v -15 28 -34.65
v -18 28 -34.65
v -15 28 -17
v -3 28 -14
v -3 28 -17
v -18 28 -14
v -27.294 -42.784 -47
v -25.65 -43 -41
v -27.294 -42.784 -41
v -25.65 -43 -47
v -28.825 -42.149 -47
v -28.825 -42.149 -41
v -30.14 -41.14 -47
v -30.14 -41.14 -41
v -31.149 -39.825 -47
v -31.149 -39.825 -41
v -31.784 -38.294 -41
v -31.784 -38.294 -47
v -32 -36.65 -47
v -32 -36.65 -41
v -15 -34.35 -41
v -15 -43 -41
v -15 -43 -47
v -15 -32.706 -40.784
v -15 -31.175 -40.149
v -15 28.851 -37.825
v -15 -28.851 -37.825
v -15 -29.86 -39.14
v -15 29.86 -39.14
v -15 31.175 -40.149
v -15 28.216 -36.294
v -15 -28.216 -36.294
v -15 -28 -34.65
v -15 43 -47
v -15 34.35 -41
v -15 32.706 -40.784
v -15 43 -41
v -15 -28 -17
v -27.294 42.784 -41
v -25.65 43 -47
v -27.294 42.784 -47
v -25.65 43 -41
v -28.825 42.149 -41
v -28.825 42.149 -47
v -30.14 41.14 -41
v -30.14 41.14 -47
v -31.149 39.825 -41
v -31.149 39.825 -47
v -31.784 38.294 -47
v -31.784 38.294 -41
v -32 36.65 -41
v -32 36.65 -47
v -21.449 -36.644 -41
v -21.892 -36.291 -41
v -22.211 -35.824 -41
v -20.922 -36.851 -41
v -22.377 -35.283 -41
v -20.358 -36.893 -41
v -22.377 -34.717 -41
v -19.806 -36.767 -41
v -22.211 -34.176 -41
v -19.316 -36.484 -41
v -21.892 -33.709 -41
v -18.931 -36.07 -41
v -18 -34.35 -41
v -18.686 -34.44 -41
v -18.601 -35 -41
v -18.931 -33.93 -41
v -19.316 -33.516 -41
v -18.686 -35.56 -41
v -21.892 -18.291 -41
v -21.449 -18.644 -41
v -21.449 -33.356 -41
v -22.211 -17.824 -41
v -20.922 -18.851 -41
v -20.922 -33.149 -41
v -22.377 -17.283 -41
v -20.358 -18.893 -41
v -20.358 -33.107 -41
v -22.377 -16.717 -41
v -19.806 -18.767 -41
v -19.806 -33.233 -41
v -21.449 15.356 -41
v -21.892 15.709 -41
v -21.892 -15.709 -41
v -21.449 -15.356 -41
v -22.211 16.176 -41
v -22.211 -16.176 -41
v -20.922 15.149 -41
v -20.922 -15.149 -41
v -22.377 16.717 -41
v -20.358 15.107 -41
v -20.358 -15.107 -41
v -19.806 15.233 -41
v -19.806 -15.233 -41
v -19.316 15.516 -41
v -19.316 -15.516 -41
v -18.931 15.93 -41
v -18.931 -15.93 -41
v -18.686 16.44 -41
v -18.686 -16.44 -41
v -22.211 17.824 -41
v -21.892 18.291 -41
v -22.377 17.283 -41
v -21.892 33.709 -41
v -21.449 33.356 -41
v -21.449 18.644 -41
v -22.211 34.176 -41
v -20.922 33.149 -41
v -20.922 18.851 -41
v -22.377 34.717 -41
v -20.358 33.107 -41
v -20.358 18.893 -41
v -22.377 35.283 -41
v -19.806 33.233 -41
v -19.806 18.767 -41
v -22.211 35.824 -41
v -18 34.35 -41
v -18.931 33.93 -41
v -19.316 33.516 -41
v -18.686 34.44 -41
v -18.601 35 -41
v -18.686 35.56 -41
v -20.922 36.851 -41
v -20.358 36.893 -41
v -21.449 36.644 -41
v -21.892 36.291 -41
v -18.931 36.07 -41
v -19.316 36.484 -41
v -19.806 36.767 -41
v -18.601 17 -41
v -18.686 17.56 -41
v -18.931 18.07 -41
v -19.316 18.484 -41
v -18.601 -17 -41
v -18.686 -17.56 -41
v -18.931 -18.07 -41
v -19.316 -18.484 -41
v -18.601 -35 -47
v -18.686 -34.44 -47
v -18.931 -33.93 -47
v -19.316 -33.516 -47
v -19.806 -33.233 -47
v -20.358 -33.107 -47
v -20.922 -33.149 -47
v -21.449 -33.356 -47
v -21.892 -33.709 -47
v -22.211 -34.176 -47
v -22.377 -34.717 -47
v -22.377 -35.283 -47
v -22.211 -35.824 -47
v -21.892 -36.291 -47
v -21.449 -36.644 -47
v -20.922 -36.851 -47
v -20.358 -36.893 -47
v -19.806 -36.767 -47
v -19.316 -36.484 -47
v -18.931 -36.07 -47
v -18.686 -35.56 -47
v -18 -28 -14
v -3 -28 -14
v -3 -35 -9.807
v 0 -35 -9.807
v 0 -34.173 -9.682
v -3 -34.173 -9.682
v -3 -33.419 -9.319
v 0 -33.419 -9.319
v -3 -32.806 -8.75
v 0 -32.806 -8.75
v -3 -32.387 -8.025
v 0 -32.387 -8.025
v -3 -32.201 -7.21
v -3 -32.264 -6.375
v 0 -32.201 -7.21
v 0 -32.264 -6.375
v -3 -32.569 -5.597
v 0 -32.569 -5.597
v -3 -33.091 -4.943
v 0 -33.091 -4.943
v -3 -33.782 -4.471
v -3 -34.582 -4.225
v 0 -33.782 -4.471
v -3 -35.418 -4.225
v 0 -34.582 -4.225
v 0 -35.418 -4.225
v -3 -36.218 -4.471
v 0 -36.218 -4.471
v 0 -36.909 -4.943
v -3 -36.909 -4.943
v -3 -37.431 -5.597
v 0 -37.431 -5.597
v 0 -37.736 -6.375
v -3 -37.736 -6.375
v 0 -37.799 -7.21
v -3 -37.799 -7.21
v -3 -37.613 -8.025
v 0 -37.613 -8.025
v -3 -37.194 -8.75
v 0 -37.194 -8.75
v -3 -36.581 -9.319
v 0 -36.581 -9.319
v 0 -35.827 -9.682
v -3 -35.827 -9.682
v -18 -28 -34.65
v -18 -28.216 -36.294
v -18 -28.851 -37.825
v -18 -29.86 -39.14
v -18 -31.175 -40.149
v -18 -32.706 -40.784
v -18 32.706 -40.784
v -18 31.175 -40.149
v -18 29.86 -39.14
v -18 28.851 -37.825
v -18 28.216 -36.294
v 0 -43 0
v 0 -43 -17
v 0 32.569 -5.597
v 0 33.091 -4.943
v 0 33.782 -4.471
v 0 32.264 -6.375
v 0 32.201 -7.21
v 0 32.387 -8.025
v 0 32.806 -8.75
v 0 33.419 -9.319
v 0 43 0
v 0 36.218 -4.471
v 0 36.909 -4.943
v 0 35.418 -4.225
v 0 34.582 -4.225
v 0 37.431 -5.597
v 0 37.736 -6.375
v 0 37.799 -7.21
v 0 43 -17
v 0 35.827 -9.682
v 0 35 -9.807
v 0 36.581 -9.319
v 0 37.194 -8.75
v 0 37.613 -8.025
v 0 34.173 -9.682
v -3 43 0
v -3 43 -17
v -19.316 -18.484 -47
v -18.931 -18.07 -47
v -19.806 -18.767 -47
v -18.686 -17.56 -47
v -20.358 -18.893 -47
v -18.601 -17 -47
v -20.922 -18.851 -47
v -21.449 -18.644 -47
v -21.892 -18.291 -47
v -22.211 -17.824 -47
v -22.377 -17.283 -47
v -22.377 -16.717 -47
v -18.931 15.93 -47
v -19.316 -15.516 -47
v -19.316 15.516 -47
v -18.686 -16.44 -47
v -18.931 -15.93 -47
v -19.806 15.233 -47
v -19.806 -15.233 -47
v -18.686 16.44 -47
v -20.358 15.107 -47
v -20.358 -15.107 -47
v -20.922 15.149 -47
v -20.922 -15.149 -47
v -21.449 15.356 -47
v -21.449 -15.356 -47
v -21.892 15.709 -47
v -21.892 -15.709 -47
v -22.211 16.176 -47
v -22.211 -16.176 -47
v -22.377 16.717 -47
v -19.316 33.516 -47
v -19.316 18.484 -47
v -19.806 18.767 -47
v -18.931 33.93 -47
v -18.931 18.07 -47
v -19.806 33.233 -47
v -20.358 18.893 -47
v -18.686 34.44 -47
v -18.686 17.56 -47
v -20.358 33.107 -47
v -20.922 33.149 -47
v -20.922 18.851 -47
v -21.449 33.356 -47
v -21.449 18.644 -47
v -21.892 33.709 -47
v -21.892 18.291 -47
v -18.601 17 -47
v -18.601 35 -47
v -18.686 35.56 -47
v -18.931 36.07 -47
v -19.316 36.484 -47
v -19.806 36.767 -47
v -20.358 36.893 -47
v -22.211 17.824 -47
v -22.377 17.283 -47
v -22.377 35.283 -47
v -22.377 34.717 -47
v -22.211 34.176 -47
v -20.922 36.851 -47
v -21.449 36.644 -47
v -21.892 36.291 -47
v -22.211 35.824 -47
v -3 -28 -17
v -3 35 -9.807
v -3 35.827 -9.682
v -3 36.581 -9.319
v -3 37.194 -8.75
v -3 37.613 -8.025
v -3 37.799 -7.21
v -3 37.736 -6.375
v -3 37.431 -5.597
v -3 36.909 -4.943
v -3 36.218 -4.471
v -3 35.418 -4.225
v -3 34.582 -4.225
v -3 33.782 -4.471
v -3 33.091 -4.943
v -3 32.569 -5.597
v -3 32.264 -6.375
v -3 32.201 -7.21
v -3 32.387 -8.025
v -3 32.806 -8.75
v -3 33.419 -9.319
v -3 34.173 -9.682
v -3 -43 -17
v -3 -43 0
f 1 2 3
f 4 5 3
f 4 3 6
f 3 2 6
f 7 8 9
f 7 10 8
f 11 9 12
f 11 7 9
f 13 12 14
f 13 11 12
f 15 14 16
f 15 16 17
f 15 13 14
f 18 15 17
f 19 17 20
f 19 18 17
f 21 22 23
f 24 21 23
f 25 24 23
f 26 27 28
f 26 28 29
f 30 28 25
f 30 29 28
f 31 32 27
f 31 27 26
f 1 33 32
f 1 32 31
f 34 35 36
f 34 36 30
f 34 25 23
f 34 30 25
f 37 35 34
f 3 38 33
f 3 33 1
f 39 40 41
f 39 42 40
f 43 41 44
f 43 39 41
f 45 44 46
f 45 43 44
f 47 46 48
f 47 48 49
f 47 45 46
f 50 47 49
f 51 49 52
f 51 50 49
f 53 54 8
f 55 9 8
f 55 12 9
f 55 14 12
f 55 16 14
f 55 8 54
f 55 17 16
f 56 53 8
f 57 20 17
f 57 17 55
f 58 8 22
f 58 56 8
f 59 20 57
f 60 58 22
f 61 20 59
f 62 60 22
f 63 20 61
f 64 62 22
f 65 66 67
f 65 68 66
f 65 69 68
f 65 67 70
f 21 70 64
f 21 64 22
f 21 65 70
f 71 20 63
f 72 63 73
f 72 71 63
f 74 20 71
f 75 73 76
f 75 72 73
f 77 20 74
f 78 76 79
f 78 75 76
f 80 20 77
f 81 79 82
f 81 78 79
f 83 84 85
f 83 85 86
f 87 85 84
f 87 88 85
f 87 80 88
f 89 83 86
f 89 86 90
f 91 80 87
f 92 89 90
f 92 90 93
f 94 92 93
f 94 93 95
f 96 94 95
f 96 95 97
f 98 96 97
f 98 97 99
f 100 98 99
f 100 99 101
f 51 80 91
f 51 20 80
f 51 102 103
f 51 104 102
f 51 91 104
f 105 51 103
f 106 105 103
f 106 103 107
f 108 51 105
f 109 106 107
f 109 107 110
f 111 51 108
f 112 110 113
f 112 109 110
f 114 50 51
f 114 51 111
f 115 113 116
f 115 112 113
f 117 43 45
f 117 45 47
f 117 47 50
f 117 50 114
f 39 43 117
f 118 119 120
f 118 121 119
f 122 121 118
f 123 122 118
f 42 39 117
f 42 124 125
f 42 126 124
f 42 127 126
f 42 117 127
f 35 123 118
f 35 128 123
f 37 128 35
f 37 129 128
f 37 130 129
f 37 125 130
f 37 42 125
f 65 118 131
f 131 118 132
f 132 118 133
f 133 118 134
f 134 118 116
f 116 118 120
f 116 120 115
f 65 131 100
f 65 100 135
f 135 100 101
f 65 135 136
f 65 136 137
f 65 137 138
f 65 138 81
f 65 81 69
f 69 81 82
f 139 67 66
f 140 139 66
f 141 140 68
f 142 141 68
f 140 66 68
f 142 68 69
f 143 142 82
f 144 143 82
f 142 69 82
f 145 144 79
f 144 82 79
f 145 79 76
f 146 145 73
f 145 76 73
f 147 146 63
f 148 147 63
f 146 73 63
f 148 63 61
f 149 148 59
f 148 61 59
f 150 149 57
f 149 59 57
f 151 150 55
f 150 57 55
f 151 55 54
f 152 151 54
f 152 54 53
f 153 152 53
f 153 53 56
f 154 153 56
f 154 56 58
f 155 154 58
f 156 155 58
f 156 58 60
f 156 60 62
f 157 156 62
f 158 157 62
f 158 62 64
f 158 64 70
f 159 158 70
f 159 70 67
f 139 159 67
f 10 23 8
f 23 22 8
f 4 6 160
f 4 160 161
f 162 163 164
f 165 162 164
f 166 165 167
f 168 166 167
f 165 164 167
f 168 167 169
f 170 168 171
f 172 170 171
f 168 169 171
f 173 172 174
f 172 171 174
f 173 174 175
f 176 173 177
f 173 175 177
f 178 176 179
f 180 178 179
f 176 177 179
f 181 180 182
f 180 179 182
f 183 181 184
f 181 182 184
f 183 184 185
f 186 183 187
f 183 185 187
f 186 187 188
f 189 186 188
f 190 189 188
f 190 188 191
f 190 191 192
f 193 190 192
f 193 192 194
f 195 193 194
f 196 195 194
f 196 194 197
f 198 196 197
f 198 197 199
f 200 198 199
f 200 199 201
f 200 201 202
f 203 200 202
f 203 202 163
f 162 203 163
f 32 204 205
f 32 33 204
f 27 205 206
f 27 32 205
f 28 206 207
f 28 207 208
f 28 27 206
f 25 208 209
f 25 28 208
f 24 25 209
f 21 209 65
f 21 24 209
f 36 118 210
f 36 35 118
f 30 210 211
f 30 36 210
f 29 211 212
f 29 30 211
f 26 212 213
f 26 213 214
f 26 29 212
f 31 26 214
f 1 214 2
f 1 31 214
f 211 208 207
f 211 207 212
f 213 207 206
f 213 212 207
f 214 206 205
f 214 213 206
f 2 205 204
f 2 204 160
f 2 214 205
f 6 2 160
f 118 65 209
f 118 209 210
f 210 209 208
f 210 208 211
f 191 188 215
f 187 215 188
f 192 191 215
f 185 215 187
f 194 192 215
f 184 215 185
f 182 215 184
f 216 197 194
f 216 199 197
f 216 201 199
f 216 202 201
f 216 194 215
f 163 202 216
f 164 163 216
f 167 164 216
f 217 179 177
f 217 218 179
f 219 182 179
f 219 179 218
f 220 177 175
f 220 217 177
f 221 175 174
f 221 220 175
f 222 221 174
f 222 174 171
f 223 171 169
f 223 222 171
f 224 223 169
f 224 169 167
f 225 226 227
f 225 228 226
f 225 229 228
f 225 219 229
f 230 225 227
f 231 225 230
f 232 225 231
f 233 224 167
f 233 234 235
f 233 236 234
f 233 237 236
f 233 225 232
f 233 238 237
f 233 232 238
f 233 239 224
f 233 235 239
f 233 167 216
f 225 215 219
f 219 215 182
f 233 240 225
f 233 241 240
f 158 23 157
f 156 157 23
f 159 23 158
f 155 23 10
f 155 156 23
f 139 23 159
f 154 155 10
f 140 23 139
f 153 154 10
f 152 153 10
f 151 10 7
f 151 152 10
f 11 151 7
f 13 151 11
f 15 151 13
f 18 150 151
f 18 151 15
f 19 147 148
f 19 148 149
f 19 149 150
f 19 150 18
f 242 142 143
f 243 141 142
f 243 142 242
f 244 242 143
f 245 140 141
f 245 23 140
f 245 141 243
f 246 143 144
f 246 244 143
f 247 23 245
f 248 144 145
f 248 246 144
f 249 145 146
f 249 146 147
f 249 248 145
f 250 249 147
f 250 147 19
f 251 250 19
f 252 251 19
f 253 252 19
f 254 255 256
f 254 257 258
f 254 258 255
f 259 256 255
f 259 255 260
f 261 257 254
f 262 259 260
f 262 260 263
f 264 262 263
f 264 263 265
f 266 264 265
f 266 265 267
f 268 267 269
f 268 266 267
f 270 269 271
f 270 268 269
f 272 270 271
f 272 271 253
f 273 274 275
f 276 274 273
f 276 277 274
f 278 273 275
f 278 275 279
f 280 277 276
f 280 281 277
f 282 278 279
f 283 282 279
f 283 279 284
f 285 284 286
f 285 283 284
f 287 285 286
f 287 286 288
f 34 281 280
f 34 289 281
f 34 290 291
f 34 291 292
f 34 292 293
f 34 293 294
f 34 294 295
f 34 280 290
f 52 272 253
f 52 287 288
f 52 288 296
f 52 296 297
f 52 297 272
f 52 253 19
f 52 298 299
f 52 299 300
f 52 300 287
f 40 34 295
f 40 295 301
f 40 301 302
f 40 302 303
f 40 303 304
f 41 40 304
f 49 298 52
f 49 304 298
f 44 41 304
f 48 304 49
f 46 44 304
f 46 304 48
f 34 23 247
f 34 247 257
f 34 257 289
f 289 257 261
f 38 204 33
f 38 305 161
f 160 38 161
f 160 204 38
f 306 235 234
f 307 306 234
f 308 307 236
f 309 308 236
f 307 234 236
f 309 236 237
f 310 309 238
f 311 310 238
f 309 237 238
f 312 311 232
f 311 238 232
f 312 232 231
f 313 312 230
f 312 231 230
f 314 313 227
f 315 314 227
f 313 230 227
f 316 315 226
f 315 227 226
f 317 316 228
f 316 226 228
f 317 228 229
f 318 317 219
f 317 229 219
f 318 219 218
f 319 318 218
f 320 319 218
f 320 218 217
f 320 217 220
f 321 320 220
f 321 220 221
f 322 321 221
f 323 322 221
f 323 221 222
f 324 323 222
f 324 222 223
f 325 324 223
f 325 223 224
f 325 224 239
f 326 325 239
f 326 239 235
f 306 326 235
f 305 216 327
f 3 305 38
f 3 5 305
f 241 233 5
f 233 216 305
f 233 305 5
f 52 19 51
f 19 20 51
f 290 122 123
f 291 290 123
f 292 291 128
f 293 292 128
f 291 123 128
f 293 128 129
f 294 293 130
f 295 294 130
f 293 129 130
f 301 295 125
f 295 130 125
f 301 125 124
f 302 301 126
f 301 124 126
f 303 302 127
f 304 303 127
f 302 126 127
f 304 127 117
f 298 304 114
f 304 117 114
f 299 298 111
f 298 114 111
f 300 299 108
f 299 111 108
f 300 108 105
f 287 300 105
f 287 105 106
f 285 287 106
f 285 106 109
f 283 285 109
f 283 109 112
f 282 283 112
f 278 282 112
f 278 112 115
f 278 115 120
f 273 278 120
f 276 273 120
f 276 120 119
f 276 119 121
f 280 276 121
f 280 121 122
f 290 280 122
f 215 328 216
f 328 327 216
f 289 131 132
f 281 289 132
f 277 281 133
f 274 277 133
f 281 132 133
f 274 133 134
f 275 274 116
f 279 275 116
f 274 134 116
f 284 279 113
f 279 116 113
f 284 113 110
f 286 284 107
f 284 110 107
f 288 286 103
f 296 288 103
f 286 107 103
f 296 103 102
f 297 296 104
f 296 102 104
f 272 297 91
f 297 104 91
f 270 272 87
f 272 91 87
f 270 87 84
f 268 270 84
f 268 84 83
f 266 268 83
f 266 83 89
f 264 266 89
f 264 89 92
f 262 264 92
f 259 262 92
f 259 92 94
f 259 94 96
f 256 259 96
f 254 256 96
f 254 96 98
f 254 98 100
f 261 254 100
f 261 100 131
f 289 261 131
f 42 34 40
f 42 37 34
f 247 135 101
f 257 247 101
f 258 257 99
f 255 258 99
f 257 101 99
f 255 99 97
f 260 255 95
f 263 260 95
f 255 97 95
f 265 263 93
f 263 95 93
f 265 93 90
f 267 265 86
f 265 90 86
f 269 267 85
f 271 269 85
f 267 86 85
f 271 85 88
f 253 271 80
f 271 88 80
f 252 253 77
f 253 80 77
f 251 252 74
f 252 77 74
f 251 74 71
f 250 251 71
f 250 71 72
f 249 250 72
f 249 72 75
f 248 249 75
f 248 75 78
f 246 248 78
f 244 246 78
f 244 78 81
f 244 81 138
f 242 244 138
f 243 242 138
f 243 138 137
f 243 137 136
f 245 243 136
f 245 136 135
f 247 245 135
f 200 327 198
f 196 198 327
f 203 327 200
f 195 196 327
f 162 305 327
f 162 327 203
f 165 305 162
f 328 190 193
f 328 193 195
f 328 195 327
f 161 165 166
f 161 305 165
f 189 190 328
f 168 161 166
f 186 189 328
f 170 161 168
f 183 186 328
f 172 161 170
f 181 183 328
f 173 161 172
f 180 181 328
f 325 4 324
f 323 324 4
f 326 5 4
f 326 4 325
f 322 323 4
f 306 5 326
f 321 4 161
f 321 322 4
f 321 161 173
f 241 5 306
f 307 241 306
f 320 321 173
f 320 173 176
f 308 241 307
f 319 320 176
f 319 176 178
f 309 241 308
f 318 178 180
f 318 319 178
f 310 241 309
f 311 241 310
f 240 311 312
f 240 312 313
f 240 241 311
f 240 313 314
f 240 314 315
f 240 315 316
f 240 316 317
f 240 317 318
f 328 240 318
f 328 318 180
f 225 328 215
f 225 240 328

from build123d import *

# Parameters (mm, degrees)
EXTRUDE_THIN1_DEPTH        = 43
SKETCH7_W                  = 27
SKETCH7_H                  = 15
CUT_EXTRUDE3_DEPTH         = 15
FILLET1_R                  = 6.35
SKETCH11_W                 = 17
SKETCH11_H                 = 86
BOSS_EXTRUDE1_DEPTH        = 3
F_10_24_TAPPED_HOLE2_D     = 3.7973
FILLET2_R                  = 6.35
F_10_CLEARANCE_HOLE2_D     = 5.6134
F_10_CLEARANCE_HOLE2_DEPTH = 9.53
F_10_CLEARANCE_HOLE2_TIP   = 1.686435499


with BuildPart() as part:
    # Sketch1 → Extrude-Thin1 (new body, symmetric)
    with BuildSketch(Plane(origin=(0, 0, 0), x_dir=(1, 0, 0), z_dir=(0, 1, 0))):
        Polygon((0, 0), (0, 17), (-15, 17), (-15, 44), (-32, 44), (-32, 41), (-18, 41), (-18, 14), (-3, 14), (-3, 0), align=None)
    extrude(amount=EXTRUDE_THIN1_DEPTH, both=True)

    # Sketch7 → Cut-Extrude3 (cut)
    with BuildSketch(Plane.ZY.offset(18)):
        with Locations((-27.5, 35.5)):
            Rectangle(SKETCH7_W, SKETCH7_H)
    cut_extrude3 = extrude(amount=-CUT_EXTRUDE3_DEPTH, mode=Mode.SUBTRACT)

    # Mirror3: Cut-Extrude3 across plane
    add(cut_extrude3.mirror(Plane.ZX), mode=Mode.SUBTRACT)

    # Fillet1
    fillet1_edges = [part.edges().sort_by_distance(p)[0] for p in [
        (-16.5, 28, -41),
        (-16.5, -28, -41),
    ]]
    fillet(fillet1_edges, radius=FILLET1_R)

    # Sketch11 → Boss-Extrude1 (add)
    with BuildSketch(Plane(origin=(0, 0, -44), x_dir=(-1, 0, 0), z_dir=(0, 0, -1))):
        with Locations((23.5, 0)):
            Rectangle(SKETCH11_W, SKETCH11_H)
    extrude(amount=BOSS_EXTRUDE1_DEPTH)

    # #10-24 Tapped Hole2 (through all)
    with Locations(Plane(origin=(-13.4585207, 10.001554842, -47), x_dir=(-1, 0, 0), z_dir=(0, 0, -1))):
        with Locations((7.0414793, -27.001554842), (7.0414793, 24.998445158), (7.0414793, 6.998445158), (7.0414793, -45.001554842)):
            Hole(F_10_24_TAPPED_HOLE2_D / 2)

    # Fillet2
    fillet2_edges = [part.edges().sort_by_distance(p)[0] for p in [
        (-32, -43, -44),
        (-32, 43, -44),
    ]]
    fillet(fillet2_edges, radius=FILLET2_R)

    # #10 Clearance Hole2
    with Locations(Plane.ZY.offset(3)):
        with Locations((-7, -35), (-7, 35)):
            Hole(F_10_CLEARANCE_HOLE2_D / 2, depth=F_10_CLEARANCE_HOLE2_DEPTH)
            with Locations((0, 0, -(F_10_CLEARANCE_HOLE2_DEPTH + F_10_CLEARANCE_HOLE2_TIP / 2))):  # 118° drill point
                Cone(0, F_10_CLEARANCE_HOLE2_D / 2, F_10_CLEARANCE_HOLE2_TIP, mode=Mode.SUBTRACT)


solid = part.part
